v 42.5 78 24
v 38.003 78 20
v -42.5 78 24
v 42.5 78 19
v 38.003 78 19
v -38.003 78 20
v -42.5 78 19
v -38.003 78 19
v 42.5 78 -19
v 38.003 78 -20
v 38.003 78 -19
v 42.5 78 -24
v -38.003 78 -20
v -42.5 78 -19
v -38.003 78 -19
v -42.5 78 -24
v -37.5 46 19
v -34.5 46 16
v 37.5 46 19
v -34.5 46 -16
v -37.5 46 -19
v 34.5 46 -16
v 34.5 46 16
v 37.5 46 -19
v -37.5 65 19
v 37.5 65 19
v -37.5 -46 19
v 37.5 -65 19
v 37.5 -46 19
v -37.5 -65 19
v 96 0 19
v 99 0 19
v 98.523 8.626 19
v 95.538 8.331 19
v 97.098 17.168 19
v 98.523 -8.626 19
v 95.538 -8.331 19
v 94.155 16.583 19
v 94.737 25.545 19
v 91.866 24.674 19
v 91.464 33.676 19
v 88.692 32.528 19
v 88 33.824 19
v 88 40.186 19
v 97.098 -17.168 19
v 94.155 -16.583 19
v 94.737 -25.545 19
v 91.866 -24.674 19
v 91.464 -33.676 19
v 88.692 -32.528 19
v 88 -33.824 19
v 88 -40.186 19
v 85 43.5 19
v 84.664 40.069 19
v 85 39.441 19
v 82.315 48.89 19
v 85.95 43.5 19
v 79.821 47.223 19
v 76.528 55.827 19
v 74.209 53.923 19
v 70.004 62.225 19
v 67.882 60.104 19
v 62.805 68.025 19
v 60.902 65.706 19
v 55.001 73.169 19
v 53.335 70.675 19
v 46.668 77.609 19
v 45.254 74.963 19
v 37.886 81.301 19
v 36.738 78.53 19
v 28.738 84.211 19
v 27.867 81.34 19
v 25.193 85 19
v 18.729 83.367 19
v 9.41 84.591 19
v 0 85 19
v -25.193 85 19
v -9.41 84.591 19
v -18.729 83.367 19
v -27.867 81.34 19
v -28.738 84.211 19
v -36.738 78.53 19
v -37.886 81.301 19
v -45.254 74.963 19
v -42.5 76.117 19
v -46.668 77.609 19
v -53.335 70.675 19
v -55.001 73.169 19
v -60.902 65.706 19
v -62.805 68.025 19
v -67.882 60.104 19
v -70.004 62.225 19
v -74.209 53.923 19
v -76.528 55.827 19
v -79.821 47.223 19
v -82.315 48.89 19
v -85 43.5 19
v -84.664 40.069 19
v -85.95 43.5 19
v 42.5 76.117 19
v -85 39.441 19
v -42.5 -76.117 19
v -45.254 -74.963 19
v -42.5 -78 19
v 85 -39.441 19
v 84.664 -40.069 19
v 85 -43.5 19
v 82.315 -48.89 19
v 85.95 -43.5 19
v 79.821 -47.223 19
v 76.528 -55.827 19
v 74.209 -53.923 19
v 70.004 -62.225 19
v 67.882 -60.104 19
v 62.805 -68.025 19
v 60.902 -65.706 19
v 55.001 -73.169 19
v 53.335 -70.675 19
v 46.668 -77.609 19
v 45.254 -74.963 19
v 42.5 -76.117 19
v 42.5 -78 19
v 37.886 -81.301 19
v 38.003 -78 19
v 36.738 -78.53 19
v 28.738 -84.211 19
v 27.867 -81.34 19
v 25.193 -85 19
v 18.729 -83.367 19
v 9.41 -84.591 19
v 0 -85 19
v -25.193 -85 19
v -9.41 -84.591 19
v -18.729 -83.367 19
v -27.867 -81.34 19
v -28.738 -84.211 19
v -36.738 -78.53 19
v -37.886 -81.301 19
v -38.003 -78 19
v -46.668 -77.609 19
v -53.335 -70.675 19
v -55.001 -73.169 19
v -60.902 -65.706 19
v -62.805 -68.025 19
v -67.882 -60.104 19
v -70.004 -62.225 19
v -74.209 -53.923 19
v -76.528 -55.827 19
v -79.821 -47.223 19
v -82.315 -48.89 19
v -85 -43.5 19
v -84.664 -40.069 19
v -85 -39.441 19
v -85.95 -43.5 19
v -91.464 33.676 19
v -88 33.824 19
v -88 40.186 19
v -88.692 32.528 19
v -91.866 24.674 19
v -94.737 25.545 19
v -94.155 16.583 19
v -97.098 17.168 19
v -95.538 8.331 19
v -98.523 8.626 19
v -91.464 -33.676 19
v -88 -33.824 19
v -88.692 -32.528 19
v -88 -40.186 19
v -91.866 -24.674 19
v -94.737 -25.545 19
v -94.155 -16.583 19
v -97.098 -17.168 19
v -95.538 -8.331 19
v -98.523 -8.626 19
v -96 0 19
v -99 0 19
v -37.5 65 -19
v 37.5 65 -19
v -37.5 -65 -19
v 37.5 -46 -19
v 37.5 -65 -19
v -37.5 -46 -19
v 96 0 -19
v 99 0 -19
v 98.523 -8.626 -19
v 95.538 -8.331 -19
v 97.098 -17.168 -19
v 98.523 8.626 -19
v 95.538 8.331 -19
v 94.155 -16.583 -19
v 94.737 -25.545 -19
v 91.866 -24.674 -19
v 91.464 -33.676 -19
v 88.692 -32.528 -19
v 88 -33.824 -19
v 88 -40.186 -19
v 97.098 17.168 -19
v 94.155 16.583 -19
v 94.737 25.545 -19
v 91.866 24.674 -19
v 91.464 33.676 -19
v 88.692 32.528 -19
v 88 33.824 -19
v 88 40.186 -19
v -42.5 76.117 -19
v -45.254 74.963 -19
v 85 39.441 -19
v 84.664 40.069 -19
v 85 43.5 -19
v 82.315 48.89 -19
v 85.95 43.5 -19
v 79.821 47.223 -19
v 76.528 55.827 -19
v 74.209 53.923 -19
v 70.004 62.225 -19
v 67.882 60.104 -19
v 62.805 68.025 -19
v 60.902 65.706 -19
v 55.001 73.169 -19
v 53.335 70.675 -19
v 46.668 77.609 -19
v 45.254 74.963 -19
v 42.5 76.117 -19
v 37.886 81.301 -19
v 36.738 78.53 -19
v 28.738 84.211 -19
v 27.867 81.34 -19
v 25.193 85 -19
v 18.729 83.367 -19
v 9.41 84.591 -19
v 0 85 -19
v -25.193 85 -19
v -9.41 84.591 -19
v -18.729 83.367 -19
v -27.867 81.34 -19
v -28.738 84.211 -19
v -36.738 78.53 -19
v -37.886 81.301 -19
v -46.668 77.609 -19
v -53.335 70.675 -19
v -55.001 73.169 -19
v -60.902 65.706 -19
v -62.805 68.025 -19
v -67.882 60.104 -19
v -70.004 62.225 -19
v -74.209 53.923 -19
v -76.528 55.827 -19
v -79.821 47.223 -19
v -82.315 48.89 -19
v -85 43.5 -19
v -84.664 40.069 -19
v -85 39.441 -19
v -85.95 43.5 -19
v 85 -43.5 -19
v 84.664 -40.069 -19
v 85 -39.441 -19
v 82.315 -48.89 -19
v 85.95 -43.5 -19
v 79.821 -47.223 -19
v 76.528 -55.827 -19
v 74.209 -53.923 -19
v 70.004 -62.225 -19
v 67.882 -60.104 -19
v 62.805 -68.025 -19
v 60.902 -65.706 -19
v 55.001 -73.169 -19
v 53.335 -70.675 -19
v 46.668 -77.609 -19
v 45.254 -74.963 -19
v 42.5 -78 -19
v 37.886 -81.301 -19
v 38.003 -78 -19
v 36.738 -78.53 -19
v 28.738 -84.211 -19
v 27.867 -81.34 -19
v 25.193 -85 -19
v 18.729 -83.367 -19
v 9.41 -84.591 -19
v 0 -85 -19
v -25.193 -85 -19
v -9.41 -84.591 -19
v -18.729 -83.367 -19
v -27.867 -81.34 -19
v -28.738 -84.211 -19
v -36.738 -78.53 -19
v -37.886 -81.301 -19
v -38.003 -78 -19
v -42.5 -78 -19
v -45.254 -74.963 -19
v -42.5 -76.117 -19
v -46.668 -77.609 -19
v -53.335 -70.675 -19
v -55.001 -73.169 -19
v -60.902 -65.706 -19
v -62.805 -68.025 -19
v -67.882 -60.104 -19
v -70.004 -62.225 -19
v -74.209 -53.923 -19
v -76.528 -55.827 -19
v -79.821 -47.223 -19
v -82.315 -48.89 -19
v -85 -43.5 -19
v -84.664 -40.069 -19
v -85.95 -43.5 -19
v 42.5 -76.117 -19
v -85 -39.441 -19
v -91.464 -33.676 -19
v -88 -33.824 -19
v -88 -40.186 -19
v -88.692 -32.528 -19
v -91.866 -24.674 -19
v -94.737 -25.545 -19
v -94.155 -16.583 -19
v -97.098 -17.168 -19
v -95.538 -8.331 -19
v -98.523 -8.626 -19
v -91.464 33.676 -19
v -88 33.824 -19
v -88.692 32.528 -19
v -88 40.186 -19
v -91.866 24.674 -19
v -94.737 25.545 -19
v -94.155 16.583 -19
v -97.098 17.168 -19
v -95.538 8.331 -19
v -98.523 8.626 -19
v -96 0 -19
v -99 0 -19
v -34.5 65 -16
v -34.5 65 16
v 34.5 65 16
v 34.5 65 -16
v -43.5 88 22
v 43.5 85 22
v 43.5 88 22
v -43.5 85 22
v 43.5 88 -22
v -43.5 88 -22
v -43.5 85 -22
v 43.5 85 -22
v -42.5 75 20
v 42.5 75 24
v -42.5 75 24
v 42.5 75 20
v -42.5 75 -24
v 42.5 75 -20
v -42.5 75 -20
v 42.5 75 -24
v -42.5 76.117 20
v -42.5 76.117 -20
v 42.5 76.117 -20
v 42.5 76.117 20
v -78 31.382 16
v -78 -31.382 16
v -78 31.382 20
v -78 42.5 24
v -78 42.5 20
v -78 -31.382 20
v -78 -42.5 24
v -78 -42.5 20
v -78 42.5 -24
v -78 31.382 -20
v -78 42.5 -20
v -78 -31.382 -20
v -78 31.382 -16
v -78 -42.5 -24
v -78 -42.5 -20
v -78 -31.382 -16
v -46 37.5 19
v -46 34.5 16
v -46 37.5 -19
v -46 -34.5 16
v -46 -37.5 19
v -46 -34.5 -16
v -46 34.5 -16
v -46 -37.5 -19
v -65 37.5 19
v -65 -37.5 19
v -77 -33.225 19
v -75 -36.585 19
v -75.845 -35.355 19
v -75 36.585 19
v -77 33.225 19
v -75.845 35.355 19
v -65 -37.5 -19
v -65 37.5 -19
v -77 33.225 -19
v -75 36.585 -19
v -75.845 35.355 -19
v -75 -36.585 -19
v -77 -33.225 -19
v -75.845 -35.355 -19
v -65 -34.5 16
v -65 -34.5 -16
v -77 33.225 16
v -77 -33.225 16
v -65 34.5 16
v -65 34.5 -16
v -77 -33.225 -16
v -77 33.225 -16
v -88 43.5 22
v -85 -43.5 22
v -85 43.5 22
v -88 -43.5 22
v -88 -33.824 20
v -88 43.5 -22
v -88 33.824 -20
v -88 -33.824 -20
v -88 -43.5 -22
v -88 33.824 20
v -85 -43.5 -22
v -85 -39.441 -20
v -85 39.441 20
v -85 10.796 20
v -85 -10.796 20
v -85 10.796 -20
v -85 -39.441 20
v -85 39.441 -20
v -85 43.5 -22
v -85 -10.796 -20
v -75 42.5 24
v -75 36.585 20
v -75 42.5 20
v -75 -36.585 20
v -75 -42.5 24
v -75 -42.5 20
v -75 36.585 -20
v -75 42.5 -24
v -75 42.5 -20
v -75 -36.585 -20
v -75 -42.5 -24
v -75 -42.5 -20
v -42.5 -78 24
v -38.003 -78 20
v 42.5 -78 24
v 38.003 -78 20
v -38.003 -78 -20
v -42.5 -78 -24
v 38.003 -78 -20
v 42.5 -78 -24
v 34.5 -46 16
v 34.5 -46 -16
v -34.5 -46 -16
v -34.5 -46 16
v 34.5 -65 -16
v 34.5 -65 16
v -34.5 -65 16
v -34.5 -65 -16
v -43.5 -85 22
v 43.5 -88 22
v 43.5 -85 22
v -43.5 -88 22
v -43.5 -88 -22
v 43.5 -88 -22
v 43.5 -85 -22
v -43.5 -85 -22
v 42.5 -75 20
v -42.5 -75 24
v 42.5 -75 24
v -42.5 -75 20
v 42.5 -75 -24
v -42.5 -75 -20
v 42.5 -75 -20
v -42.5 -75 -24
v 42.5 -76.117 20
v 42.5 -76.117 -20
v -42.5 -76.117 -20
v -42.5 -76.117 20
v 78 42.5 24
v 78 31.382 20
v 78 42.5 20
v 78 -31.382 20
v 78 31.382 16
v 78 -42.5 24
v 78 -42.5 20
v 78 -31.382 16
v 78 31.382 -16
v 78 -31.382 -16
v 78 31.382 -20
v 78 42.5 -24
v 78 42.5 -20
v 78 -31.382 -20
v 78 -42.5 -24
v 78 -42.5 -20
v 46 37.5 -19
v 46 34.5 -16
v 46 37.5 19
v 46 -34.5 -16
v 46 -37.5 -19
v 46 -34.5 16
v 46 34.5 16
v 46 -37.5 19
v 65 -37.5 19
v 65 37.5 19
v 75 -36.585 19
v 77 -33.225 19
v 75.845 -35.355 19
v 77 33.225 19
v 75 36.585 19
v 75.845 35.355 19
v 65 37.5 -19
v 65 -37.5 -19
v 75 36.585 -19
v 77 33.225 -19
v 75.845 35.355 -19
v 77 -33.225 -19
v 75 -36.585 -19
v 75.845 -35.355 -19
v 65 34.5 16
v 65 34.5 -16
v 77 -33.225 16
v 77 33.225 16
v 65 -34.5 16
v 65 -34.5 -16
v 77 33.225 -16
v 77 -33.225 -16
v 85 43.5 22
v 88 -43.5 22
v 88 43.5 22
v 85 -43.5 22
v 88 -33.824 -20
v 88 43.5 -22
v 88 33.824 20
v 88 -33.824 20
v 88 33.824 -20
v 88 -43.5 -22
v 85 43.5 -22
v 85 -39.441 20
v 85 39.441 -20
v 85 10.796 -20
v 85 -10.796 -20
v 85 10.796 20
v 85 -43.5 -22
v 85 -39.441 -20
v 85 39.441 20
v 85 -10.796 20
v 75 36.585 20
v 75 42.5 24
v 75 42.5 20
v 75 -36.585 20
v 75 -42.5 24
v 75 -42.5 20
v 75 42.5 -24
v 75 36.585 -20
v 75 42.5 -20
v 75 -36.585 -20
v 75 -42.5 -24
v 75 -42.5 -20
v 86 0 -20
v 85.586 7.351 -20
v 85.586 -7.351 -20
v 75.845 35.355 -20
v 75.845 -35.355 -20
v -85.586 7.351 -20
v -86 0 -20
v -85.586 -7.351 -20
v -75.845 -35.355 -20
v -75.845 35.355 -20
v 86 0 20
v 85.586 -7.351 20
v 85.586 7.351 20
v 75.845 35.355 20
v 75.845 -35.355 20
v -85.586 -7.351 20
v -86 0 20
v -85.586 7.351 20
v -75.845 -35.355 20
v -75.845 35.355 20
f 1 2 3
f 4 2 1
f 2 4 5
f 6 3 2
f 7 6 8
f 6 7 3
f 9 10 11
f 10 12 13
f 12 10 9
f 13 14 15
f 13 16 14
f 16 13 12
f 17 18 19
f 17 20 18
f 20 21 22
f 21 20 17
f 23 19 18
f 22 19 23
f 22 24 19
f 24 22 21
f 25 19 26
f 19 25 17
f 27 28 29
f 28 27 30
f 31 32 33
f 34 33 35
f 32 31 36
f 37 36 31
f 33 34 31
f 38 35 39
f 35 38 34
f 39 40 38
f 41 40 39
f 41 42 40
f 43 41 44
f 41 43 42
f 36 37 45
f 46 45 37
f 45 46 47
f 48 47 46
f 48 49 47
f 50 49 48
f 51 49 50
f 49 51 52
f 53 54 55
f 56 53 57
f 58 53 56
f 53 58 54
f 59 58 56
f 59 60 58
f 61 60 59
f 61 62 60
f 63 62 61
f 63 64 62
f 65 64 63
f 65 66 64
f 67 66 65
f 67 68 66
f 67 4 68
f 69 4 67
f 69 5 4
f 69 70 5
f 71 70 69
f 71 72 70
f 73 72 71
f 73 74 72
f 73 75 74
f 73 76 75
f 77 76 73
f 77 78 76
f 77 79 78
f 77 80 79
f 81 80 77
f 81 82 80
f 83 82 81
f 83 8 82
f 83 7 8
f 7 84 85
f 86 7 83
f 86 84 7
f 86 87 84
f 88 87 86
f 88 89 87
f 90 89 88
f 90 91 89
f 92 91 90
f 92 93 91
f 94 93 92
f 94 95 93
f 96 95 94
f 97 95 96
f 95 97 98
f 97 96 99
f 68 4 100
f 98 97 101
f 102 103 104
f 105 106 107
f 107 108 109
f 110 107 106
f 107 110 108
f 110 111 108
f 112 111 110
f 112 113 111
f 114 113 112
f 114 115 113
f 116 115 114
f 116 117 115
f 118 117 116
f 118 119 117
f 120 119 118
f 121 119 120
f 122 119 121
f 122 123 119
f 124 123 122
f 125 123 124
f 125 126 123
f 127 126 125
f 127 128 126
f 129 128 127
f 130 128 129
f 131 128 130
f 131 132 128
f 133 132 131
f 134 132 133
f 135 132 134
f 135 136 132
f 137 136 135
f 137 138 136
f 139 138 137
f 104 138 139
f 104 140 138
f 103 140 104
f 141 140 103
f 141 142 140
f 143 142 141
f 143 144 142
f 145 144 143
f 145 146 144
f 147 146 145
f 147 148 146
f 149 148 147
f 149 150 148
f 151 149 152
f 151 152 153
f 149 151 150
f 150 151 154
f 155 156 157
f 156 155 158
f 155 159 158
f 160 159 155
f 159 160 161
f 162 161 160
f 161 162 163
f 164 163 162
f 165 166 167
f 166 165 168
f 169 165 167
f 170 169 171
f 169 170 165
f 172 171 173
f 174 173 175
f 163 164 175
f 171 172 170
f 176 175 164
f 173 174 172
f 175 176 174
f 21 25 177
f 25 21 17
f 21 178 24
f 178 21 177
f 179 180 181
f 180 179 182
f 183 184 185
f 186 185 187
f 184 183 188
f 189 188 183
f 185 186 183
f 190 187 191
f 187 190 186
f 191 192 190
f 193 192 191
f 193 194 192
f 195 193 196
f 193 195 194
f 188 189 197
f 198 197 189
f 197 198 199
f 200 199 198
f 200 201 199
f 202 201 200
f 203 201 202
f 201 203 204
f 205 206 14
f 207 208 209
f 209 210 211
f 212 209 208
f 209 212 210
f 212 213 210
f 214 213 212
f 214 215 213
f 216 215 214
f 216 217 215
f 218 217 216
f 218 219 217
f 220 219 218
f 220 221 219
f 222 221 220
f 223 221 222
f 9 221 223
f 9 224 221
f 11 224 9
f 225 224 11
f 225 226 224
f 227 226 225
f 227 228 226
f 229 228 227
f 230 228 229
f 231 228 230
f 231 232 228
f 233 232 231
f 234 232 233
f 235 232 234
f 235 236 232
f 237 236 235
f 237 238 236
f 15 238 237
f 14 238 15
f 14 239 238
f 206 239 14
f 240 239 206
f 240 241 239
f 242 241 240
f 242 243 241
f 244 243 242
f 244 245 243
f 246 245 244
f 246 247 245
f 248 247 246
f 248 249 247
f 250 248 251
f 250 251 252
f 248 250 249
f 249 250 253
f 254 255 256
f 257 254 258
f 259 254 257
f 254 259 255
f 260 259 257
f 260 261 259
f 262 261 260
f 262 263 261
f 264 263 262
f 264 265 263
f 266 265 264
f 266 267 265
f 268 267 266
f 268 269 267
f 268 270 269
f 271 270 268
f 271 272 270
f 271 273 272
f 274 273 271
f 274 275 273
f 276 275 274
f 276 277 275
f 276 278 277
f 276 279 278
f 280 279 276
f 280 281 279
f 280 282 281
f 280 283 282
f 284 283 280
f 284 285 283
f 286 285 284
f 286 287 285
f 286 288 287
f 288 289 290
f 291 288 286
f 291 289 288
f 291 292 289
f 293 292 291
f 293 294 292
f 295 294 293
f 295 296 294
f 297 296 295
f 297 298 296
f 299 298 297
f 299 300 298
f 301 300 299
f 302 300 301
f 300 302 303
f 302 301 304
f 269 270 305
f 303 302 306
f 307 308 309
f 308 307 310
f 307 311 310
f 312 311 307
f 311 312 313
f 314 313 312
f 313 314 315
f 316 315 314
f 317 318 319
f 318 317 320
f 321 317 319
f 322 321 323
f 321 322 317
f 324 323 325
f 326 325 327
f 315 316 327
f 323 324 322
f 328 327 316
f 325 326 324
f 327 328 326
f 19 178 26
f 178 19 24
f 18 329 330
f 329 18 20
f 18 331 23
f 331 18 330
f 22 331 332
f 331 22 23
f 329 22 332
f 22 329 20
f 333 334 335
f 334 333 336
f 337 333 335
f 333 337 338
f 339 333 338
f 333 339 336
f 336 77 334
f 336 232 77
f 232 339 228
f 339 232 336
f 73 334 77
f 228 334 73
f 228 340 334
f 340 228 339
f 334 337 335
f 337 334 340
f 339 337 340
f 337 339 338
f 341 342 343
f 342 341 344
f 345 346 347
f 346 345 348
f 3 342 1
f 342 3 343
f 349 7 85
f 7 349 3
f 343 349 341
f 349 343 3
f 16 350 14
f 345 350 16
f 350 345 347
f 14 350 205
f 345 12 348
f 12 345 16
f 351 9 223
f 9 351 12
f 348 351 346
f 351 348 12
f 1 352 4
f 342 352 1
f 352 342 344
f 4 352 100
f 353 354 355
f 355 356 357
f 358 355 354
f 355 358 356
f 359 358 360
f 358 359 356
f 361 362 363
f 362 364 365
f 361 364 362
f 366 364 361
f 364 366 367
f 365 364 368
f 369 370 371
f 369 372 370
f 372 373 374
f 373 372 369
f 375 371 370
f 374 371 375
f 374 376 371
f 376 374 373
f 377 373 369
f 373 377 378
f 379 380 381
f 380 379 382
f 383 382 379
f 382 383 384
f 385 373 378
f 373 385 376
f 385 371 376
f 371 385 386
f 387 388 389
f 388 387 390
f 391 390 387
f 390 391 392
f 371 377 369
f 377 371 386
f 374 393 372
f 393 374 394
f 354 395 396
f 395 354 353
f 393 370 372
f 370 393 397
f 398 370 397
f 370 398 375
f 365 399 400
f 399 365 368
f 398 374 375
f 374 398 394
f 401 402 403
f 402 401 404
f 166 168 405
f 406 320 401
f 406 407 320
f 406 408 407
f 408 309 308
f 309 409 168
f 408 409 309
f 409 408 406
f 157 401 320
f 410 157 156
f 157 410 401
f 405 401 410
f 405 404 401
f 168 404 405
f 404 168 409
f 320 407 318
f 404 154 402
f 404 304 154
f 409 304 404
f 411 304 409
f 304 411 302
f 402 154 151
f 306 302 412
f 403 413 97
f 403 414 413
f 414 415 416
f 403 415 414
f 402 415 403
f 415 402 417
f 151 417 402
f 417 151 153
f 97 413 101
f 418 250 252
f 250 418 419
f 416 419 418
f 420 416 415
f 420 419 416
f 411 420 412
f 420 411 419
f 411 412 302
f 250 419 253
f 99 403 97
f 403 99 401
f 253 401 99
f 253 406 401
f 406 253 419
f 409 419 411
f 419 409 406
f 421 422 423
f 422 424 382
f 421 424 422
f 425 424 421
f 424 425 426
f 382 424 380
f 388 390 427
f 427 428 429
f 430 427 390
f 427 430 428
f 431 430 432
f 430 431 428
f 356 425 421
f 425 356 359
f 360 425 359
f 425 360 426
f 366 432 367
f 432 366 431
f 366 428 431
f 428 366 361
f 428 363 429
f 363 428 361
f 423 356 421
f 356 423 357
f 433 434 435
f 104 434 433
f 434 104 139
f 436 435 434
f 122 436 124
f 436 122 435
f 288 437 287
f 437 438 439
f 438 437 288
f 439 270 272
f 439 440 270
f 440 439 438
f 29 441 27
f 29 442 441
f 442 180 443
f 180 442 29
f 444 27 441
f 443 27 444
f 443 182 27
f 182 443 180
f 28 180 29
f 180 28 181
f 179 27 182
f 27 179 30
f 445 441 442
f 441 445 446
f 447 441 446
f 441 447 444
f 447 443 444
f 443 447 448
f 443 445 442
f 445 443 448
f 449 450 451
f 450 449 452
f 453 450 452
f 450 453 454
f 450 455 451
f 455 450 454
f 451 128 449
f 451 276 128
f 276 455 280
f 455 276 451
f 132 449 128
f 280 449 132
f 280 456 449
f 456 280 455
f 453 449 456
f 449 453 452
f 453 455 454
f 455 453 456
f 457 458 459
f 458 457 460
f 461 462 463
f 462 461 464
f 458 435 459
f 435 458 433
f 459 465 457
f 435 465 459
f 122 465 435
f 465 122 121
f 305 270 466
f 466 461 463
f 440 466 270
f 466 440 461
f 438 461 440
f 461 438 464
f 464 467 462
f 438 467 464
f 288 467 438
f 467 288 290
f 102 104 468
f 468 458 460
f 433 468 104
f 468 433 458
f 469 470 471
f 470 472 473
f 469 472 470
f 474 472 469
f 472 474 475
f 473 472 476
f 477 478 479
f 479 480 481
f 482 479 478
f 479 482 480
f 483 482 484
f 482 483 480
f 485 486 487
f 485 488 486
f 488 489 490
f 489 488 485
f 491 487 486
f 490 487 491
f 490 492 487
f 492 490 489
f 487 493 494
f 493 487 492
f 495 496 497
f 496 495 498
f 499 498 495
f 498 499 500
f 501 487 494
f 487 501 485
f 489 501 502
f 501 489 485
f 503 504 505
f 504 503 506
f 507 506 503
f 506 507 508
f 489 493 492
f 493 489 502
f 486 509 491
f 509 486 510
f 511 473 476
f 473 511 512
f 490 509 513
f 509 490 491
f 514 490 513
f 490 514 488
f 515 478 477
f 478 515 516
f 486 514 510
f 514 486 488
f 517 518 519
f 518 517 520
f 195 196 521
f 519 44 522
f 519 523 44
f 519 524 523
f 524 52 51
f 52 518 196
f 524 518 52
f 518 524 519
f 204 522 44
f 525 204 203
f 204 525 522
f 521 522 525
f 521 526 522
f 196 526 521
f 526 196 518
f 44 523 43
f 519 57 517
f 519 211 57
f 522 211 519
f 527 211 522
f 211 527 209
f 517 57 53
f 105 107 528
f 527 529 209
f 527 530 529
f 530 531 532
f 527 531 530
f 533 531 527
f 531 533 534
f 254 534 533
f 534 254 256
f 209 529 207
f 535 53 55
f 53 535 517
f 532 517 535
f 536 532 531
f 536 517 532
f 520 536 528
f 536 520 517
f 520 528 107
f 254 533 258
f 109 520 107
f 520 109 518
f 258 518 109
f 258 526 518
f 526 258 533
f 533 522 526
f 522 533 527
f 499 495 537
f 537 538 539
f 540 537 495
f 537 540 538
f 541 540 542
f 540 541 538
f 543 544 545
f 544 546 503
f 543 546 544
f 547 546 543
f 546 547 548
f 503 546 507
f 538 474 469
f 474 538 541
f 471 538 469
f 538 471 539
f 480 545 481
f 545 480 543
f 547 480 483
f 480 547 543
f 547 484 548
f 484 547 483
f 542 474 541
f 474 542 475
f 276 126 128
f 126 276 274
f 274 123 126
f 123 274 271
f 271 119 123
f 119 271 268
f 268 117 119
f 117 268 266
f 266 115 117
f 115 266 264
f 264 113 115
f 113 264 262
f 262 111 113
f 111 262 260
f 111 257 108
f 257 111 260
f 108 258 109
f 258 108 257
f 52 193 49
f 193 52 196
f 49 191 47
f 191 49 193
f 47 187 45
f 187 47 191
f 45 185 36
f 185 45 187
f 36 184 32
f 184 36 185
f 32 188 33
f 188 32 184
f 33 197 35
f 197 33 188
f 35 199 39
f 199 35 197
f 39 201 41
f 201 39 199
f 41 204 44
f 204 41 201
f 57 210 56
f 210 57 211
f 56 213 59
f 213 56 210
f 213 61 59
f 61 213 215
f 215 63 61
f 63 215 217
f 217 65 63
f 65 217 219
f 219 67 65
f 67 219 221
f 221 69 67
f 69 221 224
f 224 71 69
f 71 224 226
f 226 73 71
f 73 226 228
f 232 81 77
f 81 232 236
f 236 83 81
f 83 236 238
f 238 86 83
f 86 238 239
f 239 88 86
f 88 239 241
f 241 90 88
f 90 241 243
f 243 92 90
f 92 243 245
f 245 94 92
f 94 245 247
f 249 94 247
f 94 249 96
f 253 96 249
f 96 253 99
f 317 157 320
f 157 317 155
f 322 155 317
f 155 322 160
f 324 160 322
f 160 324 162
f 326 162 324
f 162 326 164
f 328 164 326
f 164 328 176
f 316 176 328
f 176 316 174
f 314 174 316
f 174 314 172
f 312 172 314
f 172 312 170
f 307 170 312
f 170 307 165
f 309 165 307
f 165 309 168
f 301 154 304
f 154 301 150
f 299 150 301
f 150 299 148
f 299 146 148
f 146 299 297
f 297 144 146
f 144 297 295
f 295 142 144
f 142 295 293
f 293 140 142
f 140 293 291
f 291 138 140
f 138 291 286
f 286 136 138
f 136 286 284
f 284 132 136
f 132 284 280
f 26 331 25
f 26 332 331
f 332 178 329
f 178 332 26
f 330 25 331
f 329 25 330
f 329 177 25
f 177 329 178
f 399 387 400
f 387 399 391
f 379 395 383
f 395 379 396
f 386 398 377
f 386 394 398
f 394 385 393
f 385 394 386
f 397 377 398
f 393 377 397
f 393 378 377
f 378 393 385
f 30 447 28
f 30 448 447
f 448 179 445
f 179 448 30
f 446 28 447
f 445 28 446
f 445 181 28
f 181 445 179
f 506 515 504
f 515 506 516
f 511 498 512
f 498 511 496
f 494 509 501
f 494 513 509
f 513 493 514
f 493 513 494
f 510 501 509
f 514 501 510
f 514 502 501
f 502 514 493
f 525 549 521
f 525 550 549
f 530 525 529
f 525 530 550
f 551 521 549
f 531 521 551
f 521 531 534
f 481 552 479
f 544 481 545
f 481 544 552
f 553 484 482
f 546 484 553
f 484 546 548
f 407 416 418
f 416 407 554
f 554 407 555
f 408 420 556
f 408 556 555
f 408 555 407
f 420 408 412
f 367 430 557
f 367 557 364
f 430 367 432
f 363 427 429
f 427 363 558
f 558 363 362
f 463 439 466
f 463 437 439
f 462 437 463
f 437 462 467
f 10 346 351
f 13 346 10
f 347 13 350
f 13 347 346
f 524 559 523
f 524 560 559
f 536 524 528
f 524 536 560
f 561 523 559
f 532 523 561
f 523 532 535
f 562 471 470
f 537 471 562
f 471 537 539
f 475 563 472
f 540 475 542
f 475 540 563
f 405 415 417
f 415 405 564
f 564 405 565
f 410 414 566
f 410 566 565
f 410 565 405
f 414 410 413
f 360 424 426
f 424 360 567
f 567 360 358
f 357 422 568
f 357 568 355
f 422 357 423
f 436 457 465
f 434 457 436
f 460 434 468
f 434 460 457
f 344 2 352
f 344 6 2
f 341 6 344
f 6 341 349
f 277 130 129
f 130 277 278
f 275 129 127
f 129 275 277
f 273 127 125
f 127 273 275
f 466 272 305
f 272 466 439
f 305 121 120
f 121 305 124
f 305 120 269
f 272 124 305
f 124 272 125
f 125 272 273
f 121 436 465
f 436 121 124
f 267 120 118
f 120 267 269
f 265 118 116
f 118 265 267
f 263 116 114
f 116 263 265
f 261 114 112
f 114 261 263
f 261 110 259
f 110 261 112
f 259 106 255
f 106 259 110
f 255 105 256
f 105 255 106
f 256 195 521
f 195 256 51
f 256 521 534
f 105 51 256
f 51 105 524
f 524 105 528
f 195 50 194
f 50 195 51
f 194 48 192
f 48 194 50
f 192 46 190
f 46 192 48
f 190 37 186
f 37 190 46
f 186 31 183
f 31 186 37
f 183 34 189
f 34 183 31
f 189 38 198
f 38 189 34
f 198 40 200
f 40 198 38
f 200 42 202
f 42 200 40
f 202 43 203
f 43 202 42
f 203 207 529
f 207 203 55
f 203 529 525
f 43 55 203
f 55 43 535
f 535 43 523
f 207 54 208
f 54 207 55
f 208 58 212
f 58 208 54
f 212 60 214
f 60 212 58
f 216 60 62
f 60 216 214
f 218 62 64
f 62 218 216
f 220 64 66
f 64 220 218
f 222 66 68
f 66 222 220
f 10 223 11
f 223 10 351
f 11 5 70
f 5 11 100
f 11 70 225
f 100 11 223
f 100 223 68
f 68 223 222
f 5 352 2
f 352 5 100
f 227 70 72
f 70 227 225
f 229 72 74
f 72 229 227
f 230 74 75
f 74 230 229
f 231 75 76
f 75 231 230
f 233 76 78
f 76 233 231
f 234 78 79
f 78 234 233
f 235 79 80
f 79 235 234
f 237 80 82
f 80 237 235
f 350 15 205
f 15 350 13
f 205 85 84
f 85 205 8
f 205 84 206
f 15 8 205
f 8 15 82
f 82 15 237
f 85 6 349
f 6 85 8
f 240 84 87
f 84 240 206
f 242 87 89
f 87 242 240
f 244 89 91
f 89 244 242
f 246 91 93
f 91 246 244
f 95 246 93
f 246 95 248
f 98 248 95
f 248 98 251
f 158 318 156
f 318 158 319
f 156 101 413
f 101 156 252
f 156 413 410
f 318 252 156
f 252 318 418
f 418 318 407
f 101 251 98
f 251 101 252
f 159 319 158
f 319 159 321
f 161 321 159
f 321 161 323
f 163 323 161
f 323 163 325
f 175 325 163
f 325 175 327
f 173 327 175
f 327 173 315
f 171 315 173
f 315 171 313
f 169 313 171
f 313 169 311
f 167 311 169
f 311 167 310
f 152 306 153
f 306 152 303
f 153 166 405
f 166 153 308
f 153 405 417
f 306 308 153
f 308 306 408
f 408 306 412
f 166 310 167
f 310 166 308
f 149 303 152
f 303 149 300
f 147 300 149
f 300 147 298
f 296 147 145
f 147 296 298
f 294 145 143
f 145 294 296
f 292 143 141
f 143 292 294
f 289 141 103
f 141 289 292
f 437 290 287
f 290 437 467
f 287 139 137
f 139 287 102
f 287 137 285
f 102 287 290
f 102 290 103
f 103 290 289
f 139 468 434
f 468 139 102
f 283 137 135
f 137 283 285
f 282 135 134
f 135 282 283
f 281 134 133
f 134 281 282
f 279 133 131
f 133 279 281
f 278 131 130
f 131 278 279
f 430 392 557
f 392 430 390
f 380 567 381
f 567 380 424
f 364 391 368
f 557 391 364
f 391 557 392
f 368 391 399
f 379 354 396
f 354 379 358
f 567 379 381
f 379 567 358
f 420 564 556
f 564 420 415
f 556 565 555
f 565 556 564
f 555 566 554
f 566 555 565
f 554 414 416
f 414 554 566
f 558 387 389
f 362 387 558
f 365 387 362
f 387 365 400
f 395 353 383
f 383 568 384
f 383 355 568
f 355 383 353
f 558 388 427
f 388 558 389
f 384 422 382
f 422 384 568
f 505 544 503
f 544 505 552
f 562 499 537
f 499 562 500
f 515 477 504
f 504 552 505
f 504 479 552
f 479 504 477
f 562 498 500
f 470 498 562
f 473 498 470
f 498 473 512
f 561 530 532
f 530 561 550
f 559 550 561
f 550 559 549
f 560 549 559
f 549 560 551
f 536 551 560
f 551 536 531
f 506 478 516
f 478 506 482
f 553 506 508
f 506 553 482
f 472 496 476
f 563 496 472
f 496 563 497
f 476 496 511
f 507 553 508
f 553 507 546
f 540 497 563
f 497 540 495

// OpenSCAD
// s_neck_intake_frame.scad
// CF-PETG structural intake frame ring for Serenity Rev N 24" hull.
// Bonds into the 4 radial scoop cutouts in s_middle_canonical_edf_intake.stl
// at the neck station (Z = 30 mm in the neck shell, Z-longitudinal coords).
// Print in CF-PETG; bond with structural epoxy.
//
// Rev C (2026-06-02): Z-longitudinal axis correction.
//   Coordinate system: Z = longitudinal (fore-aft), X = lateral, Y = vertical.
//   Both middle and rear shells sit on their flat Z=0 face for printing.
//   Hull dimensions re-measured via Z-slice at Z=30 mm.
//   See blender_middle_intake_cut.py Rev C for matching hull cut parameters.
//
// Coordinate origin: hull XY centreline at intake station.
// Frame axial direction = Z (same as hull longitudinal).

// ── Hull cross-section at intake station Z = 30 mm (measured, 24" scale) ────
// Source: Z-slice sweep of s_middle_canonical_shell24.stl,
//   Serenity UAV project log 2026-06-02 (Z-longitudinal Rev C).
// At Z=30: X span=177 mm (centre X=180.9), Y span=156.5 mm (centre Y=-77.8).
// Half-dimensions from XY centreline:
//   X half-width  = 88.5 mm → HULL_W2 = 89
//   Y half-height = 78.3 mm → HULL_H2 = 78
HULL_W2  = 89;     // X lateral half-width from centreline       [mm]
HULL_H2  = 78;     // Y vertical half-height from centreline     [mm]
HULL_WL  = 177;    // full width  (= 2 × HULL_W2 − 1)
HULL_HL  = 157;    // full height (= 2 × HULL_H2 + rounding)

// ── Scoop window dimensions ──────────────────────────────────────────────────
// Matched to blender_middle_intake_cut.py Rev C: SCOOP_W=75, SCOOP_H=38.
// X-scoops: 48 mm wall remaining.  Y-scoops: 37 mm wall remaining.
// Total capture area: 4 × 75 × 38 = 11 400 mm² (≈ 107 % of EDF fan annulus).
SCOOP_W  = 75;     // circumferential window width               [mm]
SCOOP_H  = 38;     // radial window height                       [mm]

// ── Frame geometry ───────────────────────────────────────────────────────────
FRAME_AX = 38;     // axial length of frame ring (matches SCOOP_AX) [mm]
FRAME_RD = 10;     // radial depth of frame collar               [mm]
WALL     =  3;     // CF-PETG wall thickness                     [mm]
TONGUE_D =  5;     // tongue depth inserting into hull cutout    [mm]
SHOULDER =  5;     // bonding shoulder pressing on hull exterior  [mm]
LIP      =  6;     // forward aerodynamic lip projection          [mm]
DUCT_L   = 22;     // internal duct arm length inward (→ plenum) [mm]

// ── Derived ─────────────────────────────────────────────────────────────────
$fn = 64;
HALF_AX  = FRAME_AX / 2;

// ── Main module ─────────────────────────────────────────────────────────────
module neck_intake_frame() {
    difference() {
        union() {
            _elliptical_collar();
            for (a = [0, 90, 180, 270])
                rotate([0, 0, a]) _scoop_duct();
        }
        // Cut the 4 scoop windows through the collar
        for (a = [0, 90, 180, 270])
            rotate([0, 0, a]) _scoop_window();
        // Hollow the collar interior (leave WALL-thick walls)
        _collar_hollow();
    }
}

// Elliptical ring collar that matches hull outer profile + FRAME_RD
module _elliptical_collar() {
    linear_extrude(height = FRAME_AX, center = true)
    difference() {
        // Outer ellipse: hull outer surface + frame radial depth
        scale([(HULL_W2 + FRAME_RD) / HULL_W2,
               (HULL_H2 + FRAME_RD) / HULL_H2])
            ellipse(HULL_W2, HULL_H2);
        // Inner cut: hull outer surface (frame sits on hull exterior)
        ellipse(HULL_W2, HULL_H2);
    }
}

// Thin-wall hollow inside the collar (keep WALL thickness)
module _collar_hollow() {
    linear_extrude(height = FRAME_AX + 2, center = true)
    difference() {
        scale([(HULL_W2 + FRAME_RD - WALL) / HULL_W2,
               (HULL_H2 + FRAME_RD - WALL) / HULL_H2])
            ellipse(HULL_W2, HULL_H2);
        ellipse(HULL_W2 - WALL, HULL_H2 - WALL);
    }
}

// One scoop duct arm (placed pointing +Y before rotation)
// Extends radially inward from the collar opening toward the plenum
module _scoop_duct() {
    // Duct arm: rectangular tube from hull inner wall to plenum centre
    translate([0, HULL_H2, 0])
    rotate([90, 0, 0])
    linear_extrude(height = DUCT_L + FRAME_RD)
    difference() {
        square([SCOOP_W, SCOOP_H], center = true);
        square([SCOOP_W - 2*WALL, SCOOP_H - 2*WALL], center = true);
    }

    // Aerodynamic intake lip on forward edge
    translate([0, HULL_H2 + FRAME_RD, 0])
    rotate([90, 0, 0])
    linear_extrude(height = WALL)
    hull() {
        square([SCOOP_W, SCOOP_H], center = true);
        square([SCOOP_W + LIP*2, SCOOP_H + LIP], center = true);
    }

    // Registration tongue: projects into hull cutout (thin, snug fit)
    translate([0, HULL_H2 - TONGUE_D, 0])
    rotate([90, 0, 0])
    linear_extrude(height = TONGUE_D)
    square([SCOOP_W - 0.4, SCOOP_H - 0.4], center = true);  // 0.2mm clearance

    // Bonding shoulder: flange pressing on hull exterior
    translate([0, HULL_H2, 0])
    rotate([90, 0, 0])
    linear_extrude(height = WALL)
    difference() {
        square([SCOOP_W + SHOULDER*2, SCOOP_H + SHOULDER*2], center = true);
        square([SCOOP_W, SCOOP_H], center = true);
    }
}

// Window cut through collar at each scoop position
module _scoop_window() {
    translate([0, HULL_H2 - 1, 0])
    rotate([90, 0, 0])
    linear_extrude(height = FRAME_RD + 2)
    square([SCOOP_W, SCOOP_H], center = true);
}

// Helper: 2D ellipse
module ellipse(rx, ry) {
    scale([rx, ry]) circle(r = 1);
}

neck_intake_frame();
